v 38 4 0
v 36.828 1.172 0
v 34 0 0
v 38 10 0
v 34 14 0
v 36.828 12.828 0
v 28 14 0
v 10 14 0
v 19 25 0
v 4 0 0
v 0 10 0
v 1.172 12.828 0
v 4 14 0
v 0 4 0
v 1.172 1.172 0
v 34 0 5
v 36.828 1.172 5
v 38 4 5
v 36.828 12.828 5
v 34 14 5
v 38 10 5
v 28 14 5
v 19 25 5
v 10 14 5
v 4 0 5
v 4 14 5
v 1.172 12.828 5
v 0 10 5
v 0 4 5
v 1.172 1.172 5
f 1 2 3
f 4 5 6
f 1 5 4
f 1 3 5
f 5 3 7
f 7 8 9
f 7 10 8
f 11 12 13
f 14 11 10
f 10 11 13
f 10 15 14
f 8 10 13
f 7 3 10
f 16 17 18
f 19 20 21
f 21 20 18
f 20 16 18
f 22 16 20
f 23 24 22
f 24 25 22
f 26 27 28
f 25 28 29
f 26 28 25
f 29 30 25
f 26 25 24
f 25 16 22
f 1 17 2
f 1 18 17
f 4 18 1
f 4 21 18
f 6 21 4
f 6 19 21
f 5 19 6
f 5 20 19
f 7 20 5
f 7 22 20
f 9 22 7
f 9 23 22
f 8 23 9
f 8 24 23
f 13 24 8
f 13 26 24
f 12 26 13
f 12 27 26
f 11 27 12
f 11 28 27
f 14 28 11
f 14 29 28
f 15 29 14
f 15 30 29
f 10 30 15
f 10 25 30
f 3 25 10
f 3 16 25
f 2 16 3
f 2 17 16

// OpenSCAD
$fn = 32;

// ----------------------------------------------------------------------
// Ratchet pawl: 38 x 14 mm body, beak 11 mm сверху
// ----------------------------------------------------------------------

// --- parameters (mm) ---
profile_height = 5;       // extrusion height
profile_points = 15;      // points of the closed outline

profile = [[0, 4], [1.172, 1.172], [4, 0], [34, 0], [36.828, 1.172], [38, 4], [38, 10], [36.828, 12.828], [34, 14], [28, 14], [19, 25], [10, 14], [4, 14], [1.172, 12.828], [0, 10]];  // single closed polygon, 15 points, counter clockwise

// --- the one profile operation ---
linear_extrude(height = profile_height) polygon(points = profile);
